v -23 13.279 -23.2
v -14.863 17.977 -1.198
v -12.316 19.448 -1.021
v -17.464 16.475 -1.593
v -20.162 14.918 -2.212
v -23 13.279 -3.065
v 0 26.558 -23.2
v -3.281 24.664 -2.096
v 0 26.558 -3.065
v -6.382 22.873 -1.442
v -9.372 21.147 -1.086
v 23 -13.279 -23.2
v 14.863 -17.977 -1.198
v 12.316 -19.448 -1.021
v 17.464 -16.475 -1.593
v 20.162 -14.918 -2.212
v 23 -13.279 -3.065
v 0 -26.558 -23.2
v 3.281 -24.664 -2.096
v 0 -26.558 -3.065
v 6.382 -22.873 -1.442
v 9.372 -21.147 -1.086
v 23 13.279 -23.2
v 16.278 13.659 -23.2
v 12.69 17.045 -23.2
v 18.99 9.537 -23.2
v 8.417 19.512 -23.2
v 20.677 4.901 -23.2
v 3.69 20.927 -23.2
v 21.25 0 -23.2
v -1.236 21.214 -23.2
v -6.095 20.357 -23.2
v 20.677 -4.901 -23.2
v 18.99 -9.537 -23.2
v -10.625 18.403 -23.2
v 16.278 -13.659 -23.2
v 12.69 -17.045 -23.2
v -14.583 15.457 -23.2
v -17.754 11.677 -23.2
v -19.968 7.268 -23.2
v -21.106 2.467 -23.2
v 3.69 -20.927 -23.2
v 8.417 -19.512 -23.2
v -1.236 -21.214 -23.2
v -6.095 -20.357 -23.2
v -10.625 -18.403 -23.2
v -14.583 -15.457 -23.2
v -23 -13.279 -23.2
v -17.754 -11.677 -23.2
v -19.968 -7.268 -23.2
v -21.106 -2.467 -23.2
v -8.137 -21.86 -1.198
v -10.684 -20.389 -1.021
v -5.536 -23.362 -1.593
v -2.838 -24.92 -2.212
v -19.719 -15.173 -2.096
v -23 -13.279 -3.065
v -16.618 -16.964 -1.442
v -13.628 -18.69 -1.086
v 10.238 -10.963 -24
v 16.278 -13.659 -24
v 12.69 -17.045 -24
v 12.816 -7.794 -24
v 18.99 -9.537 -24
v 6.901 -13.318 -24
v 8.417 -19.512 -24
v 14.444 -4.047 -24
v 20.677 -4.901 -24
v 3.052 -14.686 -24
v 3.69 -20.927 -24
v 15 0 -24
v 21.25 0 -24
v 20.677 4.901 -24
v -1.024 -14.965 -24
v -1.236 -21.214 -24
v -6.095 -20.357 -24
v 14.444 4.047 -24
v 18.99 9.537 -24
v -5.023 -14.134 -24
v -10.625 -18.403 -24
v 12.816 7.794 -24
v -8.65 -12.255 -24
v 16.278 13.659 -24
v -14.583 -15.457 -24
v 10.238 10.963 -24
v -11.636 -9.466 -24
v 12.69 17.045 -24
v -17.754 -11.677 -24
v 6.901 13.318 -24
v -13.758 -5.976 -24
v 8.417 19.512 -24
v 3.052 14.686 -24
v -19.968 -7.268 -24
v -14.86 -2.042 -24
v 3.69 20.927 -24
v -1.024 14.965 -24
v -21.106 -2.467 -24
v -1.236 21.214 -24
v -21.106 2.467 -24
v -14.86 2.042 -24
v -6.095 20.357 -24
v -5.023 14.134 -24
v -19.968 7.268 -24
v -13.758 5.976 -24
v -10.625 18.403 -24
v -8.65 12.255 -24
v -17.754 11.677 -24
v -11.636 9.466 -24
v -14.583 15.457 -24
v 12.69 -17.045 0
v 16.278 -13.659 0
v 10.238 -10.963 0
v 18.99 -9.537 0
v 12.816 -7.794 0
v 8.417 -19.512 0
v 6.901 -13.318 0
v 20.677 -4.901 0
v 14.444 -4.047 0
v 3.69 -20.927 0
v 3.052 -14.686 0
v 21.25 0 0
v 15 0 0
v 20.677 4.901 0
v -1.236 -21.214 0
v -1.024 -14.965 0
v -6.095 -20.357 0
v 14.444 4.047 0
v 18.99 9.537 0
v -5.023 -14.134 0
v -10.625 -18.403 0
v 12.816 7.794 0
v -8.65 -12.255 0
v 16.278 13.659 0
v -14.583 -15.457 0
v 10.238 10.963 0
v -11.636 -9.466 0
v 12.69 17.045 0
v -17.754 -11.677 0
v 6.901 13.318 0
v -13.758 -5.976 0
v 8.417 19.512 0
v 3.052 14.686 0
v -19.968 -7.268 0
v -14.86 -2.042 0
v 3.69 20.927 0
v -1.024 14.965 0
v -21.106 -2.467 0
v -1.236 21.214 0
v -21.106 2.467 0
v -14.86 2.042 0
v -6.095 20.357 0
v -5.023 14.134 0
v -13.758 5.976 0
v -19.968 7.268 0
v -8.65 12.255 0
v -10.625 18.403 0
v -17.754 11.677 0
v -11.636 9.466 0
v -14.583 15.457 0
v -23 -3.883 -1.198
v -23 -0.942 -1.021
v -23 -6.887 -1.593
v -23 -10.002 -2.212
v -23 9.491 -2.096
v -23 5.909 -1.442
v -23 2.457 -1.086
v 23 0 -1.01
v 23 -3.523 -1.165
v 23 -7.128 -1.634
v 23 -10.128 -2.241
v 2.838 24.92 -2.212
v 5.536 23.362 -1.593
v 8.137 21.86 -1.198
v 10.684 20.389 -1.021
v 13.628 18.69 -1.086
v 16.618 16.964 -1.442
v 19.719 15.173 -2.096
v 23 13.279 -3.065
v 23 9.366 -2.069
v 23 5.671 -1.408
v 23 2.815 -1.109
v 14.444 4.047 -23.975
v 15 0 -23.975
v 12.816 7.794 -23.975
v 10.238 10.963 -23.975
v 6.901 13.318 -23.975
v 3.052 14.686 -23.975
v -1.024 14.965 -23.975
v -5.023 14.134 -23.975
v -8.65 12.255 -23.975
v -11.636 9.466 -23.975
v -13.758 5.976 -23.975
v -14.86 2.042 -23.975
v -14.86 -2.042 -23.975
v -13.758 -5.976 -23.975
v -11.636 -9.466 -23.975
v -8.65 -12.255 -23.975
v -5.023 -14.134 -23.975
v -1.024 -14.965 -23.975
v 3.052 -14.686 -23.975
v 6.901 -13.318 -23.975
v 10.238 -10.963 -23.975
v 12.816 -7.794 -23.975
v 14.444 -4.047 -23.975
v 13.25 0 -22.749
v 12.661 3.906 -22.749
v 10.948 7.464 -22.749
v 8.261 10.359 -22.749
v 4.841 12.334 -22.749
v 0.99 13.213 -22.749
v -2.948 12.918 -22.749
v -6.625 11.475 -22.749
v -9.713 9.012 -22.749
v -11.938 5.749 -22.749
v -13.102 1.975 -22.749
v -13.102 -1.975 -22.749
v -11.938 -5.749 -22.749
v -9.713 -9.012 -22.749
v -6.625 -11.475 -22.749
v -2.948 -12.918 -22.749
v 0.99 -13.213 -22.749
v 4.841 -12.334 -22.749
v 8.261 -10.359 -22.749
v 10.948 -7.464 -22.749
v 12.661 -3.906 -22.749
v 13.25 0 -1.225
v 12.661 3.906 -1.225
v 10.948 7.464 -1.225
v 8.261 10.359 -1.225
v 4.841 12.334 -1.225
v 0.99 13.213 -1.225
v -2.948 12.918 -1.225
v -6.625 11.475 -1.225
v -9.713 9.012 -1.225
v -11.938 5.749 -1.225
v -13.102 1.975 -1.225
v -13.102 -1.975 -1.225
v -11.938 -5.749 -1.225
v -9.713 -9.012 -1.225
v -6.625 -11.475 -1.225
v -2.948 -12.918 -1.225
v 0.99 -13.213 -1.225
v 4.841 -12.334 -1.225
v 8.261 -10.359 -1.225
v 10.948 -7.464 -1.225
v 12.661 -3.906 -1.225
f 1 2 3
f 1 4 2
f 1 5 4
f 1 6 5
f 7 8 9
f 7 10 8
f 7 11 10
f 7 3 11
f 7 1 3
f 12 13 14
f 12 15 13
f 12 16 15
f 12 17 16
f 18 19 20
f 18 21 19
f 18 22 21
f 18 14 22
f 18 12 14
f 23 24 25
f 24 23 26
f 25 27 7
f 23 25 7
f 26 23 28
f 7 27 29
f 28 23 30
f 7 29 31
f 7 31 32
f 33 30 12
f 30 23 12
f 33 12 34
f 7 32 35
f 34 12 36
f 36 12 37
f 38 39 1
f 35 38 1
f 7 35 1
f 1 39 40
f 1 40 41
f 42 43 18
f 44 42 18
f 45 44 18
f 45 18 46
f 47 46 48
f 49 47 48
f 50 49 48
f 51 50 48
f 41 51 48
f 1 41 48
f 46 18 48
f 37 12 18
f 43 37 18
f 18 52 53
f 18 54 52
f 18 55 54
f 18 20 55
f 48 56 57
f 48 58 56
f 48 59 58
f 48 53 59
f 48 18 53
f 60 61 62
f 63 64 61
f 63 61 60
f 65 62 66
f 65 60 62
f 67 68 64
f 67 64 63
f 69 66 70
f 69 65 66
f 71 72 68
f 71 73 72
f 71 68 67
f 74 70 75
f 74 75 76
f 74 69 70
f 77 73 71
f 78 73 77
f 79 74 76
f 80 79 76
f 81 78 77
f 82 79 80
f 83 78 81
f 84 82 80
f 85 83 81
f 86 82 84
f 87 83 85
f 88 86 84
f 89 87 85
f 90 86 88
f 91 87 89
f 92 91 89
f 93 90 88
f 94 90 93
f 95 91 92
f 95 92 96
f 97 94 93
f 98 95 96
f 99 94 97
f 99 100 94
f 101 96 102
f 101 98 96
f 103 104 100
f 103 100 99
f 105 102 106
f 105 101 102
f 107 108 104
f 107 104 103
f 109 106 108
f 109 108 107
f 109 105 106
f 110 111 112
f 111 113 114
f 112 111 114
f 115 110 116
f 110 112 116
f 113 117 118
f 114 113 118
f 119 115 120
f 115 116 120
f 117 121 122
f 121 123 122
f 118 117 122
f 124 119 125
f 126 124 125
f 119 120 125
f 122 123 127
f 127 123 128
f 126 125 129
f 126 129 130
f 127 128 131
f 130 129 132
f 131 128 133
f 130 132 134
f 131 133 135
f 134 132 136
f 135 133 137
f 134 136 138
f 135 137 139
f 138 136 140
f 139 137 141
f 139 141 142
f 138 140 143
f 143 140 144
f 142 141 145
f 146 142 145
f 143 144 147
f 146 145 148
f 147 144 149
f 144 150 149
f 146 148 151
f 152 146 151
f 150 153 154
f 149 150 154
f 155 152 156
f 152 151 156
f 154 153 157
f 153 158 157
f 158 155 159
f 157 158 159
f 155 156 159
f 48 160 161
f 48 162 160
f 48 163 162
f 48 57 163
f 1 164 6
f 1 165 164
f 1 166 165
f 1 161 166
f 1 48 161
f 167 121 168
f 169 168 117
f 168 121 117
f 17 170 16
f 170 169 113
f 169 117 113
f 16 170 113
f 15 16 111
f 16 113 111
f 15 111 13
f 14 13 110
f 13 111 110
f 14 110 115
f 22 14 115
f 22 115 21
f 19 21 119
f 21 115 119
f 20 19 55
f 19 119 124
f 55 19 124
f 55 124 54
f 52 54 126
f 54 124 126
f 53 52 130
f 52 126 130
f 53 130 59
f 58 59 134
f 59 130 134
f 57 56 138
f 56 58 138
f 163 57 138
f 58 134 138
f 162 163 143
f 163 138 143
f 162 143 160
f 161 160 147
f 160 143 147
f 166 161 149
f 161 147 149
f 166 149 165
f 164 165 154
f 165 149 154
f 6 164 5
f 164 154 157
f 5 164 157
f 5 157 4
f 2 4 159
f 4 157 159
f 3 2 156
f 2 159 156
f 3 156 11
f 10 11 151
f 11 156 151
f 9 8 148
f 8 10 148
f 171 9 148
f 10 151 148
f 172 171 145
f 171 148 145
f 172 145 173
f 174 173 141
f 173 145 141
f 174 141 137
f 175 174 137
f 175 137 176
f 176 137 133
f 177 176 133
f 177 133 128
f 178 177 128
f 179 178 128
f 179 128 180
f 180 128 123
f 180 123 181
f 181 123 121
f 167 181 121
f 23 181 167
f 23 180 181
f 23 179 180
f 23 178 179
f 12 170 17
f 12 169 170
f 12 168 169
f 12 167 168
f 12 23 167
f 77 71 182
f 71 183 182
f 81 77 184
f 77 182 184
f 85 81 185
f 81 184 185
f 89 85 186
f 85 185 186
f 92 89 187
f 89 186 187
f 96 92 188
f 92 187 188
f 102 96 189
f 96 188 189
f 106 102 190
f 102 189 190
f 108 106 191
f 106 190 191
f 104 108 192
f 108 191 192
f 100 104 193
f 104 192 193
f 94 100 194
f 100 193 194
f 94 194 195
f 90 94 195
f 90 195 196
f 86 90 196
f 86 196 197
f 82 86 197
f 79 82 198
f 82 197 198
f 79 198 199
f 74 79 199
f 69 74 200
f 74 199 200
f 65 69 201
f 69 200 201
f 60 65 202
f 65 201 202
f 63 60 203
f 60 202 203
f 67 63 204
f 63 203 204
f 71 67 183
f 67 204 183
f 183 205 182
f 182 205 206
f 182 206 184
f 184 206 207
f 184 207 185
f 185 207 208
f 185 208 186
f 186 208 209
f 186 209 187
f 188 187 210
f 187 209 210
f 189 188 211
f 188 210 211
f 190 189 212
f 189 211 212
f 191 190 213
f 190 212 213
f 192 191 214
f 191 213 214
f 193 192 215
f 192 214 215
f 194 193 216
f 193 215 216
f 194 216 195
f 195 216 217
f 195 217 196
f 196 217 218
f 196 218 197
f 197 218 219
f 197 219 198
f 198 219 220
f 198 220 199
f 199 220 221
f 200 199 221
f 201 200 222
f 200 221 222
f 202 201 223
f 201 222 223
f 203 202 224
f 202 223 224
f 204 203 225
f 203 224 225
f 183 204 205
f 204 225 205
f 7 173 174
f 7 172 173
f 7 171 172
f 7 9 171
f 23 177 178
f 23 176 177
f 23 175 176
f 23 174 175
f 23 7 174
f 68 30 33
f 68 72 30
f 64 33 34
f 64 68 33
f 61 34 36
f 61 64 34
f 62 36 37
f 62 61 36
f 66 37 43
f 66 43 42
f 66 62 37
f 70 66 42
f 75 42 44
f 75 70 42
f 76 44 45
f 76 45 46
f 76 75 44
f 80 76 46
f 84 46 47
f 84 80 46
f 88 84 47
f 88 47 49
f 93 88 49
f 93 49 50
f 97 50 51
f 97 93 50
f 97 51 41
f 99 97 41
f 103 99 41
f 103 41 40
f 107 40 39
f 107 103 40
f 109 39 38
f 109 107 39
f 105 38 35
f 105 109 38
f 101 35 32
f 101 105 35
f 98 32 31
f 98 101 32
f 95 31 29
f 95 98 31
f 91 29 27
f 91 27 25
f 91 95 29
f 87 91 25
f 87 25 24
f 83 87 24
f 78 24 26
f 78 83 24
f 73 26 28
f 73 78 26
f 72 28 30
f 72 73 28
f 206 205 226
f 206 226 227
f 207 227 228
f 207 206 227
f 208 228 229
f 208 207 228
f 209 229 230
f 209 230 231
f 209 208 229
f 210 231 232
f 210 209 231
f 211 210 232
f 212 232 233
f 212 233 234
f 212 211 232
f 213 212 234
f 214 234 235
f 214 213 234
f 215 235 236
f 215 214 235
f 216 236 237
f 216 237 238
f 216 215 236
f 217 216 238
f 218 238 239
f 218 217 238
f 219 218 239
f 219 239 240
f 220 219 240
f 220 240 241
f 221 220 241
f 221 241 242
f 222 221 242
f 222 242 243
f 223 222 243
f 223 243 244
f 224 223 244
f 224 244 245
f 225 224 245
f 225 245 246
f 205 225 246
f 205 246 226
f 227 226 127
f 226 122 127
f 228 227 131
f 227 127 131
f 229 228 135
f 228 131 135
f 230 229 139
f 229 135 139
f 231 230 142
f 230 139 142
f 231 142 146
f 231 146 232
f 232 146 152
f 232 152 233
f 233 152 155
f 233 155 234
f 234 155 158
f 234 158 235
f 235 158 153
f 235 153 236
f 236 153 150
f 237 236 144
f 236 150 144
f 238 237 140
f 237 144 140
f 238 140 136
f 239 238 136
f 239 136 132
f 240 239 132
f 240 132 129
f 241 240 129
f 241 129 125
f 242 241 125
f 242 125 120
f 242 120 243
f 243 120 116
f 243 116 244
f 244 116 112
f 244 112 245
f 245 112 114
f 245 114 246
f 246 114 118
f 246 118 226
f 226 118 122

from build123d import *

# Parameters (mm, degrees)
BASENUT_START = -24
BASENUTSKE_R  = 13.25
BASENUT_DEPTH = 24
SKETCH4_W     = 0.8
SKETCH4_H     = 15.308112383


# Read off the part's stored shape, not the designer's step: ThreadSchematic
with BuildPart() as part:
    # BaseNutSke → BaseNut (new body)
    with BuildSketch(Plane.XY.offset(BASENUT_START)):
        Polygon((23, 13.279056191), (23, -13.279056191), (0, -26.558112383), (-23, -13.279056191), (-23, 13.279056191), (0, 26.558112383), align=None)
        Circle(BASENUTSKE_R, mode=Mode.SUBTRACT)
    extrude(amount=BASENUT_DEPTH)

    # Sketch5 (on Front Plane) → EndChamfer (revolve, cut)
    with BuildSketch(Plane.XY):
        Polygon((23.9746, 15), (22.626700489, 13.075), (24.0254, 13.075), (24.0254, 15), align=None)
    revolve(axis=Axis((23.9746, 15, 0), (-0.5735764363510466, -0.8191520442889915, 0)), mode=Mode.SUBTRACT)

    # Sketch4 → Bearing-Face (revolve, cut)
    with BuildSketch(Plane(origin=(0, 0, 0), x_dir=(0, 0, -1), z_dir=(1, 0, 0)), mode=Mode.PRIVATE) as bearing_face_sk:
        with Locations((23.6, 28.904056192)):
            Rectangle(SKETCH4_W, SKETCH4_H)
        Polygon((0, 21.25), (-10, 21.25), (-10, 36.558112383), (3.064640113, 36.558112383), (3.064640113, 26.558112383), align=None)
    revolve(bearing_face_sk.sketch.rotate(Axis((0, 0, 0), (0, 0, -1)), 90), axis=Axis((0, 0, 0), (0, 0, -1)), mode=Mode.SUBTRACT)

    # ThreadSchematic outline → ThreadSchematic (revolve, cut)
    with BuildSketch(Plane.XZ):
        Polygon((13.25, 0), (13.25, -1.225363192), (15, 0), align=None)
        Polygon((15, -23.9746), (13.25, -22.749236808), (13.25, -24), (15, -24), align=None)
    revolve(axis=Axis((0, 0, 0), (0, 0, 1)), mode=Mode.SUBTRACT)


solid = part.part
